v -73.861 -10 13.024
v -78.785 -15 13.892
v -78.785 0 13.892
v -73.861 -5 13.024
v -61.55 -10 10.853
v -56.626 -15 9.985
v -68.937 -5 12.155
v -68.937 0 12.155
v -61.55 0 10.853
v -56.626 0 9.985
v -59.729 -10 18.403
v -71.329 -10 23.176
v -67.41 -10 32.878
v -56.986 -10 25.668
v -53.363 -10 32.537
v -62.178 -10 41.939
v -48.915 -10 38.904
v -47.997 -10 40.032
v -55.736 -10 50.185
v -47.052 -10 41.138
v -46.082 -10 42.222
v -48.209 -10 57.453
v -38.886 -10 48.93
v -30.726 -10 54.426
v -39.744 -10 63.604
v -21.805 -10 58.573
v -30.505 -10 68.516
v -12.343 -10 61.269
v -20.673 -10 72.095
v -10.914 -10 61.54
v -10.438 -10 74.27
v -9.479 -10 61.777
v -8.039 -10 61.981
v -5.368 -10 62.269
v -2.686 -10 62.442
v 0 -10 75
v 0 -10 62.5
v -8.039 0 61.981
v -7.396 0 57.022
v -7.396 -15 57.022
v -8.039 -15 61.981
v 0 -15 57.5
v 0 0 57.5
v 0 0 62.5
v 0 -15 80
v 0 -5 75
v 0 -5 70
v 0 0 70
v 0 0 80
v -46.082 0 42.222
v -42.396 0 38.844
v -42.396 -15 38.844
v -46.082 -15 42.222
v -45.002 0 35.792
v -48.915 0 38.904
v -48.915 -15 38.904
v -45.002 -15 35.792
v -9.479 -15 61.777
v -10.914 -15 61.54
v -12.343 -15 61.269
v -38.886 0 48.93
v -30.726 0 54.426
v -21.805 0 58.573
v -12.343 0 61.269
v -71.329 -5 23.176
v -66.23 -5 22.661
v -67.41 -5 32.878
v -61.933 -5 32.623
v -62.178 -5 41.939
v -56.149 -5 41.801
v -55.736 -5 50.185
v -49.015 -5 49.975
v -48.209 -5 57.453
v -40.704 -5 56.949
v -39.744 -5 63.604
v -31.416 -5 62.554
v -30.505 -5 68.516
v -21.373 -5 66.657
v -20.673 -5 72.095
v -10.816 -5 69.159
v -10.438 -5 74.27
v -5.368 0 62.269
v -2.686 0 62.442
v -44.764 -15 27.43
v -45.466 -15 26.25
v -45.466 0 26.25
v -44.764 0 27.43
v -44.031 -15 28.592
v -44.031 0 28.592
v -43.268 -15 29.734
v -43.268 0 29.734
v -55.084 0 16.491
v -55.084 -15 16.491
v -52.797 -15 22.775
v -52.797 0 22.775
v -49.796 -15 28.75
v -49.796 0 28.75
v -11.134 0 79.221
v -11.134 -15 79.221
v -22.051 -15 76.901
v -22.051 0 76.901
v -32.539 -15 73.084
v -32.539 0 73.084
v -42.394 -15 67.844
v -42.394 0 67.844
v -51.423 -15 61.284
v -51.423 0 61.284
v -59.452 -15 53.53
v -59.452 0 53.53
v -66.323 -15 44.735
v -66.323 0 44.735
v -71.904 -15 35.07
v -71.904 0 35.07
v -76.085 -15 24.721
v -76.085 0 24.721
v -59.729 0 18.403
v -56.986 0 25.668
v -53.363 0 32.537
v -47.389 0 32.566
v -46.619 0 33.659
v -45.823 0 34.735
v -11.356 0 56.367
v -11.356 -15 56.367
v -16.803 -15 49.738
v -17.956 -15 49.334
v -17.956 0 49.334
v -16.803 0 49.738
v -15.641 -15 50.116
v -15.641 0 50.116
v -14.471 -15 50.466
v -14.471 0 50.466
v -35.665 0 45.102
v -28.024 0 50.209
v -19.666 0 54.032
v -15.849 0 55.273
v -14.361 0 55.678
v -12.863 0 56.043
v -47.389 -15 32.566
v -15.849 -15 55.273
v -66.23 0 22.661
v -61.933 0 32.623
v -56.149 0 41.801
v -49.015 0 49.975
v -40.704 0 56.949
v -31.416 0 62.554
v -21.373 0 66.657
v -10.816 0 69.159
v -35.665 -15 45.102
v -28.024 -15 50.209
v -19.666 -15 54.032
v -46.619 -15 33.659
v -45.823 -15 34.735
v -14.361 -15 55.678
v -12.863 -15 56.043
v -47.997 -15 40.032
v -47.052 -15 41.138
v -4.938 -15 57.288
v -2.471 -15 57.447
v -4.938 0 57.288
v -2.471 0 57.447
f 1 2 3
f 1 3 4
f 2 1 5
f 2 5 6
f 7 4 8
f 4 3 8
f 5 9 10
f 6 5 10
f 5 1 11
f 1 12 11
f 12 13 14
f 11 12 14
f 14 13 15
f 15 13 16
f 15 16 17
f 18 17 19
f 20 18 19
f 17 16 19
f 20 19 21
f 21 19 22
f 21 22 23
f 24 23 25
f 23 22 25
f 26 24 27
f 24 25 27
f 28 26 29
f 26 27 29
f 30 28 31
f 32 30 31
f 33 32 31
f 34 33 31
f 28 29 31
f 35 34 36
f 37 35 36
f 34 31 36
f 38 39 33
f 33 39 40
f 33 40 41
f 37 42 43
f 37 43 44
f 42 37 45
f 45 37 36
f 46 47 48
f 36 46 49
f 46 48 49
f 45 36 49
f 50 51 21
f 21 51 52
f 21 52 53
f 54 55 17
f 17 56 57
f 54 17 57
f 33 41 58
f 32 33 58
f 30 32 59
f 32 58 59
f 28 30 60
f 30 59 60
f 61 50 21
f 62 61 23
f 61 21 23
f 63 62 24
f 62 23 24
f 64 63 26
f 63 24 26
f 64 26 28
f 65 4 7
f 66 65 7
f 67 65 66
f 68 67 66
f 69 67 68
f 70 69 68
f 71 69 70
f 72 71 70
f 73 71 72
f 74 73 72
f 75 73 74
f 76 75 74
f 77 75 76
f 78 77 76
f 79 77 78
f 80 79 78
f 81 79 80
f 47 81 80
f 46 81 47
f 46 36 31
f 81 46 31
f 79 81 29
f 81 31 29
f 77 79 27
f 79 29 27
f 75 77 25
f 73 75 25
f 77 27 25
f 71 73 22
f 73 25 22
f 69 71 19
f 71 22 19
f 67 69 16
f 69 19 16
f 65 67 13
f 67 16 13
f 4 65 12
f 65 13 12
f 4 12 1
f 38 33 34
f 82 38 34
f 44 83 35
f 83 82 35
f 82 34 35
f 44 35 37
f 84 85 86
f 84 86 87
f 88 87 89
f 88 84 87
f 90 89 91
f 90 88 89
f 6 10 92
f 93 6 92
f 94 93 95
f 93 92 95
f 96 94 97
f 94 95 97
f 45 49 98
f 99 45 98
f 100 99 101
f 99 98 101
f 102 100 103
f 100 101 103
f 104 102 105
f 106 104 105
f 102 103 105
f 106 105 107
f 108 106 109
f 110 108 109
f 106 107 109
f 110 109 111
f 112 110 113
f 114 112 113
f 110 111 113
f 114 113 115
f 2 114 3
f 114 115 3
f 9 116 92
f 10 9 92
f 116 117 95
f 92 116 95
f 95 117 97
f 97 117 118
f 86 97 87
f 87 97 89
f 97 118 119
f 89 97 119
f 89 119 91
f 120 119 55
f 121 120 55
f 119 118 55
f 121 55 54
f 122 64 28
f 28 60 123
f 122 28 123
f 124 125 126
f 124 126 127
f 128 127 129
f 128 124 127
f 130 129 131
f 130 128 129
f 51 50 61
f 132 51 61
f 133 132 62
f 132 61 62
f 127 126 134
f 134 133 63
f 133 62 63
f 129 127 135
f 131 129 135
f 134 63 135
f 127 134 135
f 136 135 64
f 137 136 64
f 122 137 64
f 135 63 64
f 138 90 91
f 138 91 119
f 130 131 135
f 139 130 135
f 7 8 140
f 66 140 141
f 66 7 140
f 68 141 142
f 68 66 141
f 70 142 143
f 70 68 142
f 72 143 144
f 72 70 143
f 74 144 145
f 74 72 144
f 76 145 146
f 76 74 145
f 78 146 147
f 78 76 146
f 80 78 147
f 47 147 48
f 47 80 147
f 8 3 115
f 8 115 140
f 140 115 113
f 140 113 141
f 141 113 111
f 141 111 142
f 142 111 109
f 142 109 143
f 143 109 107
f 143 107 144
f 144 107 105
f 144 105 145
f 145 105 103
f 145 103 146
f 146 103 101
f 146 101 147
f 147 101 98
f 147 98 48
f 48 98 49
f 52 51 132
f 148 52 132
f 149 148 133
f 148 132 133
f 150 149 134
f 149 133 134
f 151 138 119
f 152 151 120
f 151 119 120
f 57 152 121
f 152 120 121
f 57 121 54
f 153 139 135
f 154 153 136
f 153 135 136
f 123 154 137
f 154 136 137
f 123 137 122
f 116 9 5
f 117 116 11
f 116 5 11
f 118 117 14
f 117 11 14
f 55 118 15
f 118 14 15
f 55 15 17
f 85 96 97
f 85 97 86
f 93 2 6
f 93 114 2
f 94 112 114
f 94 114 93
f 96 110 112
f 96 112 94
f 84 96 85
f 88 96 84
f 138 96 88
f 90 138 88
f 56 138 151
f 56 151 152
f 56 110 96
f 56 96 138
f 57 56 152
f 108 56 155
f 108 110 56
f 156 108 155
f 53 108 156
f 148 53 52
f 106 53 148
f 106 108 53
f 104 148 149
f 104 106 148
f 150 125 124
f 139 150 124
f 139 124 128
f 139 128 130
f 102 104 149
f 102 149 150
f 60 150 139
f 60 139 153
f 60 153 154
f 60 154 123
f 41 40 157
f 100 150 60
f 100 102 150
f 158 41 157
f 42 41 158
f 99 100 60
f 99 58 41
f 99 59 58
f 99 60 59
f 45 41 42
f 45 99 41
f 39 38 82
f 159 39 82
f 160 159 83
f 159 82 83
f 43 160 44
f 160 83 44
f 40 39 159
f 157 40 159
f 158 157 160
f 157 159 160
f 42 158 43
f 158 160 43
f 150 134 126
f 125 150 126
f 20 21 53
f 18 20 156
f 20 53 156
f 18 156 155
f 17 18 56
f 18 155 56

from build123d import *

# Parameters (mm, degrees)
F1_DEPTH = 10
F3_DEPTH = 5
F5_DEPTH = 15
F8_DEPTH = 15
F9_DEPTH = 25


# Not quite as in the source:
# - a feature names something its author has since deleted; it is built from what else it names


with BuildPart() as f1:
    # F0 (on Front) → F1 (new body, symmetric)
    with BuildSketch(Plane.XZ):
        with BuildLine():
            Line((-62.5, -30), (-62.5, 0))
            Line((-62.5, 0), (-75, 0))
            ThreePointArc((-75, 0), (-73.4179734698, -15.3232232767), (-68.7386354243, -30))
            Line((-68.7386354243, -30), (-62.5, -30))
        make_face()
        with BuildLine():
            ThreePointArc((-68.7386354243, -30), (-73.4179734698, -15.3232232767), (-75, 0))
            Line((-75, 0), (-75, -30))
            Line((-75, -30), (-68.7386354243, -30))
        make_face()
        with BuildLine():
            Line((-75, 0), (-62.5, 0))
            ThreePointArc((-62.5, 0), (-44.1941738242, 44.1941738242), (0, 62.5))
            Line((0, 62.5), (0, 75))
            ThreePointArc((0, 75), (-53.033008589, 53.033008589), (-75, 0))
        make_face()
        with BuildLine():
            ThreePointArc((0, 62.5), (23.9177145228, 57.742470782), (44.1941738242, 44.1941738242))
            Line((44.1941738242, 44.1941738242), (44.1941738242, 56.6941738242))
            Line((44.1941738242, 56.6941738242), (49.0995993303, 56.6941738242))
            ThreePointArc((49.0995993303, 56.6941738242), (26.2005435362, 70.274686185), (0, 75))
            Line((0, 75), (0, 62.5))
        make_face()
        with BuildLine():
            Line((44.1941738242, 56.6941738242), (44.1941738242, 44.1941738242))
            Line((44.1941738242, 44.1941738242), (53.033008589, 53.033008589))
            ThreePointArc((53.033008589, 53.033008589), (51.0991040315, 54.8988302897), (49.0995993303, 56.6941738242))
            Line((49.0995993303, 56.6941738242), (44.1941738242, 56.6941738242))
        make_face()
        with BuildLine():
            ThreePointArc((49.0995993303, 56.6941738242), (51.0991040315, 54.8988302897), (53.033008589, 53.033008589))
            ThreePointArc((53.033008589, 53.033008589), (56.9861303035, 48.7604445533), (60.5959982177, 44.1941738242))
            Line((60.5959982177, 44.1941738242), (79.1941738242, 44.1941738242))
            Line((79.1941738242, 44.1941738242), (79.1941738242, 56.6941738242))
            Line((79.1941738242, 56.6941738242), (49.0995993303, 56.6941738242))
        make_face()
        with BuildLine():
            Line((53.033008589, 53.033008589), (44.1941738242, 44.1941738242))
            Line((44.1941738242, 44.1941738242), (60.5959982177, 44.1941738242))
            ThreePointArc((60.5959982177, 44.1941738242), (56.9861303035, 48.7604445533), (53.033008589, 53.033008589))
        make_face()
    extrude(amount=F1_DEPTH, both=True)

    # F2 (on Front) → F3 (cut, symmetric)
    with BuildSketch(Plane.XZ):
        with BuildLine():
            Line((45.9241320293, 52.8296706156), (49.2044271743, 56.6032185167))
            ThreePointArc((49.2044271743, 56.6032185167), (-31.1019931992, 68.2470953157), (-75, 0))
            Line((-75, 0), (-70, 0))
            ThreePointArc((-70, 0), (-29.0285269859, 63.6972889614), (45.9241320293, 52.8296706156))
        make_face()
    extrude(amount=F3_DEPTH, both=True, mode=Mode.SUBTRACT)


with BuildPart() as f5:
    # F4 (on Front) → F5 (new body)
    with BuildSketch(Plane.XZ):
        with BuildLine():
            ThreePointArc((-56.6264457982, 9.9847702158), (-36.960287557, 44.0475554793), (0, 57.5))
            Line((0, 57.5), (0, 80))
            ThreePointArc((0, 80), (-51.4230087749, 61.2835554495), (-78.784620241, 13.8918542134))
            Line((-78.784620241, 13.8918542134), (-56.6264457982, 9.9847702158))
        make_face()
    extrude(amount=F5_DEPTH)

    # F6: cut F1
    add(f1.part, mode=Mode.SUBTRACT)

    # F7 (on face) → F8 (join, through all)
    with BuildSketch(Plane.XZ.offset(15)):
        with BuildLine():
            ThreePointArc((-47.389204942, 32.5655224887), (-48.6302678935, 30.6813794443), (-49.7964607176, 28.75))
            Line((-49.7964607176, 28.75), (-45.4663336987, 26.25))
            ThreePointArc((-45.4663336987, 26.25), (-44.4015489462, 28.0134334057), (-43.2684045123, 29.7337379245))
            Line((-43.2684045123, 29.7337379245), (-47.389204942, 32.5655224887))
        make_face()
        with BuildLine():
            Line((-14.4709611804, 50.4662390368), (-15.8491479595, 55.2725475165))
            ThreePointArc((-15.8491479595, 55.2725475165), (-17.7684771766, 54.685749687), (-19.6661582412, 54.0323256952))
            Line((-19.6661582412, 54.0323256952), (-17.9560575246, 49.3338625913))
            ThreePointArc((-17.9560575246, 49.3338625913), (-16.2233922047, 49.9304671055), (-14.4709611804, 50.4662390368))
        make_face()
    extrude(amount=-F8_DEPTH)

    # F7 (on face) → F9 (cut)
    with BuildSketch(Plane.XZ.offset(15)):
        with BuildLine():
            Line((-48.9153382675, 38.9042373293), (-45.0021112061, 35.7918983429))
            ThreePointArc((-45.0021112061, 35.7918983429), (-43.7255778977, 37.3406459172), (-42.395771708, 38.8438996663))
            Line((-42.395771708, 38.8438996663), (-46.0823605522, 42.221630072))
            ThreePointArc((-46.0823605522, 42.221630072), (-47.5278020627, 40.5876586056), (-48.9153382675, 38.9042373293))
        make_face()
        with BuildLine():
            ThreePointArc((-11.3558821654, 56.3674901006), (-9.3817674339, 56.7294671209), (-7.396222464, 57.0223280239))
            Line((-7.396222464, 57.0223280239), (-8.0393722435, 61.9807913303))
            ThreePointArc((-8.0393722435, 61.9807913303), (-10.1975732978, 61.6624642618), (-12.3433501798, 61.269010979))
            Line((-12.3433501798, 61.269010979), (-11.3558821654, 56.3674901006))
        make_face()
    extrude(amount=-F9_DEPTH, mode=Mode.SUBTRACT)


solid = f5.part
